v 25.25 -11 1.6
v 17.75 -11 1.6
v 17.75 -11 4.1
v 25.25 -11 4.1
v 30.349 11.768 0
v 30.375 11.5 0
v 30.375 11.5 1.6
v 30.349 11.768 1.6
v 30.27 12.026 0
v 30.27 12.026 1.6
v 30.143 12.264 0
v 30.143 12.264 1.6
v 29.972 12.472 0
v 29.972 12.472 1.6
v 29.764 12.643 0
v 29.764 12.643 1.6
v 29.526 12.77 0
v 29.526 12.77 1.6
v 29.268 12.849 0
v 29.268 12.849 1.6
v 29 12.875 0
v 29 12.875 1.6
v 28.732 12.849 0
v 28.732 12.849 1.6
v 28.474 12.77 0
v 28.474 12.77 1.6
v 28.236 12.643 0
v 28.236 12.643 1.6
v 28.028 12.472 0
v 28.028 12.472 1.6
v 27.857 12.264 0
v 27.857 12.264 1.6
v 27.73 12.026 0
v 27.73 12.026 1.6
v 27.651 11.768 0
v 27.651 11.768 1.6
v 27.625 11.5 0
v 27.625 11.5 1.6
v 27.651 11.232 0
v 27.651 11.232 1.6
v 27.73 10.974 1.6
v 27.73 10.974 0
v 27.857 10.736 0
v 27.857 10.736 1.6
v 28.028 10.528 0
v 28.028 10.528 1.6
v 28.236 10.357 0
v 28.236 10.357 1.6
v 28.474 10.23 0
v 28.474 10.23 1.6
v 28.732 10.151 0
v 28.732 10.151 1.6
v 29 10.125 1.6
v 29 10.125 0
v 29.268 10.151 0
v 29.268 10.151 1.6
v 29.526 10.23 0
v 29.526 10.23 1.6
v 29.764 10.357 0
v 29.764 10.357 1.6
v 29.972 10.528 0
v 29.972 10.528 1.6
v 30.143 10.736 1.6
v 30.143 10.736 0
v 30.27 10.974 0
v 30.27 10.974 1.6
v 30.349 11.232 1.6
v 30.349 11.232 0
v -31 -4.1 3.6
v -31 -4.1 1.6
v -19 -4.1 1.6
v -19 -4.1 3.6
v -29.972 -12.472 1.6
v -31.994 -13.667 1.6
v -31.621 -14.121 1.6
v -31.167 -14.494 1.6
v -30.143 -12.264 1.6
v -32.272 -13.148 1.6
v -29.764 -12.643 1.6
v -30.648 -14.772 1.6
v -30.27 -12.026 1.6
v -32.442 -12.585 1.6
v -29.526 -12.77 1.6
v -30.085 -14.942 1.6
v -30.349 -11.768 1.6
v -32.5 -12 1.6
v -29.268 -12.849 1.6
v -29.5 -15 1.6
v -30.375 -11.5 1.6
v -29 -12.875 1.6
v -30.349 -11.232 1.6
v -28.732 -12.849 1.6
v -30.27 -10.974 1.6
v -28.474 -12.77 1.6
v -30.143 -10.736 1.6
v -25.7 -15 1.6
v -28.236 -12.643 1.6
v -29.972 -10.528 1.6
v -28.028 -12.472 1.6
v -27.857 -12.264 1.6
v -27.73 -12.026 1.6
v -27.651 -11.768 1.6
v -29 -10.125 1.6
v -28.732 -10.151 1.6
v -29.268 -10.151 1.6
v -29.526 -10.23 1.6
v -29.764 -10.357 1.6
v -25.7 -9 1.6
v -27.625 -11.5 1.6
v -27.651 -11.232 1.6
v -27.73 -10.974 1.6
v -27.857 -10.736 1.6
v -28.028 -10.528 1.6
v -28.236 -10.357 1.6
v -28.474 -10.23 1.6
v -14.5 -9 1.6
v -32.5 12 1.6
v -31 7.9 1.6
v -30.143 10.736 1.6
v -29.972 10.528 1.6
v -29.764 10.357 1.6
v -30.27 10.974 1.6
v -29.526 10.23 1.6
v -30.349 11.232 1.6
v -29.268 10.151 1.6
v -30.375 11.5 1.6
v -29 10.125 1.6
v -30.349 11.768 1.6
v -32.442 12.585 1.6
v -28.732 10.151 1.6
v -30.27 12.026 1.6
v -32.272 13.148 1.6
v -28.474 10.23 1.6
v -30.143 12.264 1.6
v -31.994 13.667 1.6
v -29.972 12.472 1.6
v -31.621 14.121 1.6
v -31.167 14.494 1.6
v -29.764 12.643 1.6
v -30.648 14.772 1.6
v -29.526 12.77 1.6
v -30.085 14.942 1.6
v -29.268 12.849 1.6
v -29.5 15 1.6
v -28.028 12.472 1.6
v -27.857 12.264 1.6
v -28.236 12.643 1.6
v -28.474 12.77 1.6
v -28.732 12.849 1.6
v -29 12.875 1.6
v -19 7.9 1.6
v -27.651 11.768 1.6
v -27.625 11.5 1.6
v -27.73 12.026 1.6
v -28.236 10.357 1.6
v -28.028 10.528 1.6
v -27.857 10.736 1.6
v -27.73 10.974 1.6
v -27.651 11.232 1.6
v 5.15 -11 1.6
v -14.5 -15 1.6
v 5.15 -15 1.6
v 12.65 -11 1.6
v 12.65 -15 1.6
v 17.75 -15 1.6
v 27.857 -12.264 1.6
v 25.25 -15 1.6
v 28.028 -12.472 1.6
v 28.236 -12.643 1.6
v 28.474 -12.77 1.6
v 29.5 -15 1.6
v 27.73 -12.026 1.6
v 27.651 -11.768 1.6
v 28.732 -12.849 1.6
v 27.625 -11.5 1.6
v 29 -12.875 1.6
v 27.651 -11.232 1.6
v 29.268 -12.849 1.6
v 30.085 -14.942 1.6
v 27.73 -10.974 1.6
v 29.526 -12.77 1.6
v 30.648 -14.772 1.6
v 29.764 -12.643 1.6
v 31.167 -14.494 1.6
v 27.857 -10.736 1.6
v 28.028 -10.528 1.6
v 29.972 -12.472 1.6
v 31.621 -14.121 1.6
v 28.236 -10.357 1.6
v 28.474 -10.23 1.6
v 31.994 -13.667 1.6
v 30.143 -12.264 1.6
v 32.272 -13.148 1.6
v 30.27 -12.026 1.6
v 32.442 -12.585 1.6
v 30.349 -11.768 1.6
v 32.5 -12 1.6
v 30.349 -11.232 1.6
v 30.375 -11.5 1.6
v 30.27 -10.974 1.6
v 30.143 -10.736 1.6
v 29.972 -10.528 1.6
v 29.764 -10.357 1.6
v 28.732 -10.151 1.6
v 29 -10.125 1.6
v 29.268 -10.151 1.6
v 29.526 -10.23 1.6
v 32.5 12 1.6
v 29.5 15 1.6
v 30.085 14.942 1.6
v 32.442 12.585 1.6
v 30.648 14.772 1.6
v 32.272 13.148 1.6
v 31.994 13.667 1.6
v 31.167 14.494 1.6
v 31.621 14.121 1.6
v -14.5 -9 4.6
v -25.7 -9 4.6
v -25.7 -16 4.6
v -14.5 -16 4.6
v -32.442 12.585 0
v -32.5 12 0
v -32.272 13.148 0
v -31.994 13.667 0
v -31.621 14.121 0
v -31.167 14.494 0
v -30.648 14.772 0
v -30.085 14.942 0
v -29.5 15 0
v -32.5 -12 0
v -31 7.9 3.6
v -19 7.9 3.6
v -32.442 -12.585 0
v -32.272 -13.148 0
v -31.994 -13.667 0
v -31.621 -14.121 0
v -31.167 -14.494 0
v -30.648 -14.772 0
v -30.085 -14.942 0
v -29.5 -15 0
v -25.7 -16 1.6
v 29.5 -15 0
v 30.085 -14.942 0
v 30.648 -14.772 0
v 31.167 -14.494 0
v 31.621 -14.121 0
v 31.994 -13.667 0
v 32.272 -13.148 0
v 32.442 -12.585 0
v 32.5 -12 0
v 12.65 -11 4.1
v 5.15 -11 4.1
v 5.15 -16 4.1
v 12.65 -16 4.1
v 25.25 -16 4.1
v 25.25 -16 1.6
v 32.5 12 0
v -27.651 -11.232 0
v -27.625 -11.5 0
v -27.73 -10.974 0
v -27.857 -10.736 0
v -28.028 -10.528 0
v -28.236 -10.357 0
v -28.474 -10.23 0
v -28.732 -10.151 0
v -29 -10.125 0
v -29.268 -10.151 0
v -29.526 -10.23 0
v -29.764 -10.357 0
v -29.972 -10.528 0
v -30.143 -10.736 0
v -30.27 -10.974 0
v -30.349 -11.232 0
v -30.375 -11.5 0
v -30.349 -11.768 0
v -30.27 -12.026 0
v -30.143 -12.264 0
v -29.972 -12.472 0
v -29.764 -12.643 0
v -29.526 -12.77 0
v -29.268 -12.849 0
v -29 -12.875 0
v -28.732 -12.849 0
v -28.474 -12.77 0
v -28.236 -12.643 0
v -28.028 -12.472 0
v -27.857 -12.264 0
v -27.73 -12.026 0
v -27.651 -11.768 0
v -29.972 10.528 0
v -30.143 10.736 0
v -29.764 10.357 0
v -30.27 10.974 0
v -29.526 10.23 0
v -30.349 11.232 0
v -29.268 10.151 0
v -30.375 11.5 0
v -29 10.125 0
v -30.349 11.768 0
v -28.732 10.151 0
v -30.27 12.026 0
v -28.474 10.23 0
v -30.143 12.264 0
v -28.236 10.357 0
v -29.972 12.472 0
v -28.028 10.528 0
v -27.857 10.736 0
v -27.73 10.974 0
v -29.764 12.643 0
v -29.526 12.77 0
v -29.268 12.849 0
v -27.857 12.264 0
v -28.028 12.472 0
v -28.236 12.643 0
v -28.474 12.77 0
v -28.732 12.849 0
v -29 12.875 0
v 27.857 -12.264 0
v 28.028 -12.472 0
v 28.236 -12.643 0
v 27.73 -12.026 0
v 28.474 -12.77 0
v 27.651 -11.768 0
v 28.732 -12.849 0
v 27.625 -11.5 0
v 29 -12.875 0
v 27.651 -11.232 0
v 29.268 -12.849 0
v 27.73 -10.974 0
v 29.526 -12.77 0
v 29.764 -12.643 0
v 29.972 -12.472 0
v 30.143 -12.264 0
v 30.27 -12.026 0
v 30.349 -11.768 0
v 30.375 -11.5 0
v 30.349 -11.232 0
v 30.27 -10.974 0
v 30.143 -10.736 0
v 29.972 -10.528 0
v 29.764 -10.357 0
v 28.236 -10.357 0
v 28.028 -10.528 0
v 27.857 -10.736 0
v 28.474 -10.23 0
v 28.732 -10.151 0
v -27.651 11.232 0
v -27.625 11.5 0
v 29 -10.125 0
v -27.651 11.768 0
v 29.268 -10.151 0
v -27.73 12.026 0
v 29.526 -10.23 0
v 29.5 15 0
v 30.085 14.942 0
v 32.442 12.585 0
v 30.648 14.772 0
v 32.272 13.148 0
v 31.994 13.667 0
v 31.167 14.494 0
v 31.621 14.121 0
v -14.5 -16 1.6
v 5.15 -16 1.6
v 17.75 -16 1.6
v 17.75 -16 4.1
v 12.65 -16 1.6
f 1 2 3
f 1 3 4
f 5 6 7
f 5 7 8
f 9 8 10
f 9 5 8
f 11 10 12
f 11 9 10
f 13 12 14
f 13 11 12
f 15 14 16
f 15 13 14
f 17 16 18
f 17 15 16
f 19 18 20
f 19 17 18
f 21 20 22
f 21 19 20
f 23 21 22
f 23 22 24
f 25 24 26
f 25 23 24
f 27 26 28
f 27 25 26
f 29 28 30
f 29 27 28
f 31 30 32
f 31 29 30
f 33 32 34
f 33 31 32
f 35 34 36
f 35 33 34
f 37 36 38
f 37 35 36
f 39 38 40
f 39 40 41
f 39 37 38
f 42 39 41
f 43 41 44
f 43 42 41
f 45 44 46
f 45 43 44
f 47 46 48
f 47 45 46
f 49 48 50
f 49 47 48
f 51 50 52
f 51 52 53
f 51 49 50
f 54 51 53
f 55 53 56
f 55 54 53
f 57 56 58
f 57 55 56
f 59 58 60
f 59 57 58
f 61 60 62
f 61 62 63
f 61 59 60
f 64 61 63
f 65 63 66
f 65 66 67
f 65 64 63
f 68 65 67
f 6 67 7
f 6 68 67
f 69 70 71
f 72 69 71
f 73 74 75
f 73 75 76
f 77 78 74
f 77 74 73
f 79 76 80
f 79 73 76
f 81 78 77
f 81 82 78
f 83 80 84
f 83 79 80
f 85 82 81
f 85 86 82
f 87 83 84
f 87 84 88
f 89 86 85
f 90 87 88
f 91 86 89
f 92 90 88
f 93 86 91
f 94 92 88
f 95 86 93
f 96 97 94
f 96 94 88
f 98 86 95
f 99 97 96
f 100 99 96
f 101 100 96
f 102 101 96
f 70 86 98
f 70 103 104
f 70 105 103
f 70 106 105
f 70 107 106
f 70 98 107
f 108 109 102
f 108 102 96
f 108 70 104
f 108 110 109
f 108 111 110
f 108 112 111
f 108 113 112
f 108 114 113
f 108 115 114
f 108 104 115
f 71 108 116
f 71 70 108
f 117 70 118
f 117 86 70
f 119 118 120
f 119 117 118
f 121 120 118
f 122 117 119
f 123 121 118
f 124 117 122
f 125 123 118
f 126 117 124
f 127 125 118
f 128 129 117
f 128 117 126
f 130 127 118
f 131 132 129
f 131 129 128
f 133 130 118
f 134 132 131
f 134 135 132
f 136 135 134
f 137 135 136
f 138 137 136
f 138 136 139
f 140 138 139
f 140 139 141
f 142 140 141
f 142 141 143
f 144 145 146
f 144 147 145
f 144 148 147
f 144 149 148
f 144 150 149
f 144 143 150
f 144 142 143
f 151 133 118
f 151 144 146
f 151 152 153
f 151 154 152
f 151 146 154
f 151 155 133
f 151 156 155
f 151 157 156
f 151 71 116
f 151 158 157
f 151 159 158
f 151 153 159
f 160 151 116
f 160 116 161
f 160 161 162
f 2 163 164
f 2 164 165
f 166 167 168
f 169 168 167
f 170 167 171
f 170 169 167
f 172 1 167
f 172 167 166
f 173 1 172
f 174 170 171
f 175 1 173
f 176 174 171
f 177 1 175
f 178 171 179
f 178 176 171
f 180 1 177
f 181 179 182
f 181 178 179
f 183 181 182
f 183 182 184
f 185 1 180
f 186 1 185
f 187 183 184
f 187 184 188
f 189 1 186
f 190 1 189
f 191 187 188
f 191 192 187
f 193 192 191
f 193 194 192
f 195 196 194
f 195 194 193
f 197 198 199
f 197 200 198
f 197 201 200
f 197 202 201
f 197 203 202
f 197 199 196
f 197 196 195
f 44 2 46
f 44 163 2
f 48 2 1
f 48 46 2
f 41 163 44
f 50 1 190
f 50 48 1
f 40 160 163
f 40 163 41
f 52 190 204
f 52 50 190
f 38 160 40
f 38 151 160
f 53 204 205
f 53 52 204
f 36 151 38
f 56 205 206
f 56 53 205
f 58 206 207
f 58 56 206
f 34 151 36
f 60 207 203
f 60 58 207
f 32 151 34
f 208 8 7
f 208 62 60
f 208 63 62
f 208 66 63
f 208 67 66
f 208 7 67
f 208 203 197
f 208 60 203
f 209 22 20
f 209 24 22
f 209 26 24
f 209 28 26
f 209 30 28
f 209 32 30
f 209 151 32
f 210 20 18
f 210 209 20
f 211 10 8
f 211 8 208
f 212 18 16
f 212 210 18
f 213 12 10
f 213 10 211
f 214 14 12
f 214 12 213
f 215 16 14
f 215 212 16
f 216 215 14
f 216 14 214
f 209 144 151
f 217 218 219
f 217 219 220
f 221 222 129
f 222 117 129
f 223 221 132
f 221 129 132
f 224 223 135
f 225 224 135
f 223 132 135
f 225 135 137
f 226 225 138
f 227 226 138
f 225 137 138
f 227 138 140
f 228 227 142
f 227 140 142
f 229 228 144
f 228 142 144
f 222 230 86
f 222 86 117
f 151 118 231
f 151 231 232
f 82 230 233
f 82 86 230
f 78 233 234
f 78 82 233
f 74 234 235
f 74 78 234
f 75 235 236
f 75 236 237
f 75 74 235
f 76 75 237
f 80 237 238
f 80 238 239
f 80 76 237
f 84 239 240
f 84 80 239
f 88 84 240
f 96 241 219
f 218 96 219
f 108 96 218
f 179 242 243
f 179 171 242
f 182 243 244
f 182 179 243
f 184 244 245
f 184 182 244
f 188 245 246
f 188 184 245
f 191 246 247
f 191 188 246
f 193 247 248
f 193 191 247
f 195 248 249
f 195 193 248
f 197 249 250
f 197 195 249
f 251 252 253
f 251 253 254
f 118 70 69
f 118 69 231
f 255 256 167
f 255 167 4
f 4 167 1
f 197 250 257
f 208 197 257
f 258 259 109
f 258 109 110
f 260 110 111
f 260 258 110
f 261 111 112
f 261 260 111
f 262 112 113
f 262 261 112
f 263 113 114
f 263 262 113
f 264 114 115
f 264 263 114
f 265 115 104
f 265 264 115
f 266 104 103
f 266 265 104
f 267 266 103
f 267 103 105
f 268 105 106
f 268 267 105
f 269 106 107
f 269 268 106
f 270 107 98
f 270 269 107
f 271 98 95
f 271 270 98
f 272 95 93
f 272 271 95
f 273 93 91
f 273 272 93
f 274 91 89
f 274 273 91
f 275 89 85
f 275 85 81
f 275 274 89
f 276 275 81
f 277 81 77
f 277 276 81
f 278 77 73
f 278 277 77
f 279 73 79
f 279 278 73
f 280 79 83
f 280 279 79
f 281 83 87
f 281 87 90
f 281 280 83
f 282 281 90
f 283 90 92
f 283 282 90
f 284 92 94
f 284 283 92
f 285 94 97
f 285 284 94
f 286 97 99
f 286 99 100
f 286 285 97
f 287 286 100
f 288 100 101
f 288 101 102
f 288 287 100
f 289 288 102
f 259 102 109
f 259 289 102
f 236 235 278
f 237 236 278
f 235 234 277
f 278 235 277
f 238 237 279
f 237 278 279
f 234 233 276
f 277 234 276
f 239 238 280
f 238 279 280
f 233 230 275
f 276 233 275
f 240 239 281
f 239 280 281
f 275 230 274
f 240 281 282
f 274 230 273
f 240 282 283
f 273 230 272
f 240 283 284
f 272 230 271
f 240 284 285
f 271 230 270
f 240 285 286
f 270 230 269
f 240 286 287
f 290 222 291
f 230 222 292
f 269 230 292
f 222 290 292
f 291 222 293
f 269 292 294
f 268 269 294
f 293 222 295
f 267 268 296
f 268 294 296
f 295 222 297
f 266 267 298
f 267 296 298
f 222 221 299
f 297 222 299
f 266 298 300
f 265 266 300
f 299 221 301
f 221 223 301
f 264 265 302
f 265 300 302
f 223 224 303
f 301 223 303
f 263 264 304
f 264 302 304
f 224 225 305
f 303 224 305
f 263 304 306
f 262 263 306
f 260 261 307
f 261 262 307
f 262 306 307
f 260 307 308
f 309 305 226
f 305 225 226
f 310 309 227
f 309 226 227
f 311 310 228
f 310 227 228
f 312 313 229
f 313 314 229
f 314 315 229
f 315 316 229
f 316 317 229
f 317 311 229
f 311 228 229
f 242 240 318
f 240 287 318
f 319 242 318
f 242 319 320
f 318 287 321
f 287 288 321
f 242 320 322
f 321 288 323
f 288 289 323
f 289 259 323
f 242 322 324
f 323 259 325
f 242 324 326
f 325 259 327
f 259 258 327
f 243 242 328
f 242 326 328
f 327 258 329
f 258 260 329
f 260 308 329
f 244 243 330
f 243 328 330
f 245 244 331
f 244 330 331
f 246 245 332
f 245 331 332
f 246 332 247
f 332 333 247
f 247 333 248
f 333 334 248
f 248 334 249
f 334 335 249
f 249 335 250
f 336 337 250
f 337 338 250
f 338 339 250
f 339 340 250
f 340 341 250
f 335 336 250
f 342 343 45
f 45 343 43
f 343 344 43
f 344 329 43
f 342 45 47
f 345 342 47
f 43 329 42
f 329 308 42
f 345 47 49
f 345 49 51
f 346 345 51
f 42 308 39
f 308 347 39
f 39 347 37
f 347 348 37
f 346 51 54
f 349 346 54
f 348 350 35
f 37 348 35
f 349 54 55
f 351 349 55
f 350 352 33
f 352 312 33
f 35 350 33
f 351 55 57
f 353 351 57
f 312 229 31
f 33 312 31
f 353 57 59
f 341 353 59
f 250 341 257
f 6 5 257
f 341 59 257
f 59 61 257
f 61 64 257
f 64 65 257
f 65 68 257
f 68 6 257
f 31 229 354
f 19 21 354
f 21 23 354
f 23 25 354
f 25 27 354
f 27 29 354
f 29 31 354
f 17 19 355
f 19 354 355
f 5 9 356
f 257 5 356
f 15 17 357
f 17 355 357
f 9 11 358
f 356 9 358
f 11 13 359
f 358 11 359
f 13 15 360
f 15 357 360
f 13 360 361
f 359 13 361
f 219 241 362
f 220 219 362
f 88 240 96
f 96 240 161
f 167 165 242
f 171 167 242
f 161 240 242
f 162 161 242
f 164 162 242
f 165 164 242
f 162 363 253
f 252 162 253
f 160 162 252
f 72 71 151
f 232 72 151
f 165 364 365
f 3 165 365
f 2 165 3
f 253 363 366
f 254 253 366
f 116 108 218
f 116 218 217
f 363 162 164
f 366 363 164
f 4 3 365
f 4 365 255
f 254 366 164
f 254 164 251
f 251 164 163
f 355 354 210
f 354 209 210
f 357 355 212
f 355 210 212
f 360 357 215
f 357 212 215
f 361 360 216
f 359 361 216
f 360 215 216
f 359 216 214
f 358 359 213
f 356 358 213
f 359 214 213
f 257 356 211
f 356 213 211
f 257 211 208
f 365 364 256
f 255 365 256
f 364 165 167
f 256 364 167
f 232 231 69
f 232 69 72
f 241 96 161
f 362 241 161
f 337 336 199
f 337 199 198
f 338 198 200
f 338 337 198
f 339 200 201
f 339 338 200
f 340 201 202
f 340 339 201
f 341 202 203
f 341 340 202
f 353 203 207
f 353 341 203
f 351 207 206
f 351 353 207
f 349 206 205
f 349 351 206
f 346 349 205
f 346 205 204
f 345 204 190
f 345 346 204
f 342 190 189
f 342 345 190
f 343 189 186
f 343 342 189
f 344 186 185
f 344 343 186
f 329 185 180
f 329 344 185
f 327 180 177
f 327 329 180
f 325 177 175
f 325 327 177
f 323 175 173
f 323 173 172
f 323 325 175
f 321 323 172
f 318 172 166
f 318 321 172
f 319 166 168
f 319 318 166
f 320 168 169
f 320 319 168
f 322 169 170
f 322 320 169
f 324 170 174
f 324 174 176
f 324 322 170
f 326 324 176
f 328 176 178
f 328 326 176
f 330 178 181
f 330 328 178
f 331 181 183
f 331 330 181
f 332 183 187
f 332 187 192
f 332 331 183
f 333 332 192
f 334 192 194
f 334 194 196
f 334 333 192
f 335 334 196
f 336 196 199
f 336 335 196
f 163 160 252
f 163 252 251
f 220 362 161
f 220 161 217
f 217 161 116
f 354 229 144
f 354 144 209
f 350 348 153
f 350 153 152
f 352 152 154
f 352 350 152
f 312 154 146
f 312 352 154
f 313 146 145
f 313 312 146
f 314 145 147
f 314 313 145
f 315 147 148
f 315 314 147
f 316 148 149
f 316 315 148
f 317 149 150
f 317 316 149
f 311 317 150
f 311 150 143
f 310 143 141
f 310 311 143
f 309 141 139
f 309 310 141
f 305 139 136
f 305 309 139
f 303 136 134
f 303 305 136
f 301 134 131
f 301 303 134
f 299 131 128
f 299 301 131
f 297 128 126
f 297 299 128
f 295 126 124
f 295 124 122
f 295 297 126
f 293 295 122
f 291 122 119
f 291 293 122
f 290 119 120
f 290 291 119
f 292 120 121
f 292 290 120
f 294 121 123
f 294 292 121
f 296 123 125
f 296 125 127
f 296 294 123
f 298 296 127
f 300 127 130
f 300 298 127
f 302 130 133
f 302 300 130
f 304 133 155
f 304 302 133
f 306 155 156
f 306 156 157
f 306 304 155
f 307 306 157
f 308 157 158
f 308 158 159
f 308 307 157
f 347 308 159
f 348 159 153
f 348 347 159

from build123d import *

# Parameters (mm, degrees)
F0_W     = 65
F0_H     = 30
F0_R     = 1.375
F1_DEPTH = 1.6
F2_R     = 3
F3_W     = 12
F3_H     = 12
F4_DEPTH = 2
F5_W     = 11.2
F5_H     = 7
F6_DEPTH = 3
F7_W     = 7.5
F7_H     = 5
F8_DEPTH = 2.5


with BuildPart() as f1:
    # F0 (on Top) → F1 (new body)
    with BuildSketch(Plane.XY):
        Rectangle(F0_W, F0_H)
        with Locations((-29, -11.5)):
            Circle(F0_R, mode=Mode.SUBTRACT)
        with Locations((29, -11.5)):
            Circle(F0_R, mode=Mode.SUBTRACT)
        with Locations((-29, 11.5)):
            Circle(F0_R, mode=Mode.SUBTRACT)
        with Locations((29, 11.5)):
            Circle(F0_R, mode=Mode.SUBTRACT)
    extrude(amount=F1_DEPTH)

    # F2
    f2_edges = [f1.edges().sort_by_distance(p)[0] for p in [
        (-32.5, -15, 0.8),
        (-32.5, 15, 0.8),
        (32.5, -15, 0.8),
        (32.5, 15, 0.8),
    ]]
    fillet(f2_edges, radius=F2_R)

    # F3 (on face) → F4 (join)
    with BuildSketch(Plane.XY.offset(1.6)):
        with Locations((-25, 1.9)):
            Rectangle(F3_W, F3_H)
    extrude(amount=F4_DEPTH)

    # F5 (on face) → F6 (join)
    with BuildSketch(Plane.XY.offset(1.6)):
        with Locations((-20.1, -12.5)):
            Rectangle(F5_W, F5_H)
    extrude(amount=F6_DEPTH)

    # F7 (on face) → F8 (join)
    with BuildSketch(Plane.XY.offset(1.6)):
        with Locations((8.9, -13.5)):
            Rectangle(F7_W, F7_H)
        with Locations((21.5, -13.5)):
            Rectangle(F7_W, F7_H)
    extrude(amount=F8_DEPTH)


solid = f1.part
